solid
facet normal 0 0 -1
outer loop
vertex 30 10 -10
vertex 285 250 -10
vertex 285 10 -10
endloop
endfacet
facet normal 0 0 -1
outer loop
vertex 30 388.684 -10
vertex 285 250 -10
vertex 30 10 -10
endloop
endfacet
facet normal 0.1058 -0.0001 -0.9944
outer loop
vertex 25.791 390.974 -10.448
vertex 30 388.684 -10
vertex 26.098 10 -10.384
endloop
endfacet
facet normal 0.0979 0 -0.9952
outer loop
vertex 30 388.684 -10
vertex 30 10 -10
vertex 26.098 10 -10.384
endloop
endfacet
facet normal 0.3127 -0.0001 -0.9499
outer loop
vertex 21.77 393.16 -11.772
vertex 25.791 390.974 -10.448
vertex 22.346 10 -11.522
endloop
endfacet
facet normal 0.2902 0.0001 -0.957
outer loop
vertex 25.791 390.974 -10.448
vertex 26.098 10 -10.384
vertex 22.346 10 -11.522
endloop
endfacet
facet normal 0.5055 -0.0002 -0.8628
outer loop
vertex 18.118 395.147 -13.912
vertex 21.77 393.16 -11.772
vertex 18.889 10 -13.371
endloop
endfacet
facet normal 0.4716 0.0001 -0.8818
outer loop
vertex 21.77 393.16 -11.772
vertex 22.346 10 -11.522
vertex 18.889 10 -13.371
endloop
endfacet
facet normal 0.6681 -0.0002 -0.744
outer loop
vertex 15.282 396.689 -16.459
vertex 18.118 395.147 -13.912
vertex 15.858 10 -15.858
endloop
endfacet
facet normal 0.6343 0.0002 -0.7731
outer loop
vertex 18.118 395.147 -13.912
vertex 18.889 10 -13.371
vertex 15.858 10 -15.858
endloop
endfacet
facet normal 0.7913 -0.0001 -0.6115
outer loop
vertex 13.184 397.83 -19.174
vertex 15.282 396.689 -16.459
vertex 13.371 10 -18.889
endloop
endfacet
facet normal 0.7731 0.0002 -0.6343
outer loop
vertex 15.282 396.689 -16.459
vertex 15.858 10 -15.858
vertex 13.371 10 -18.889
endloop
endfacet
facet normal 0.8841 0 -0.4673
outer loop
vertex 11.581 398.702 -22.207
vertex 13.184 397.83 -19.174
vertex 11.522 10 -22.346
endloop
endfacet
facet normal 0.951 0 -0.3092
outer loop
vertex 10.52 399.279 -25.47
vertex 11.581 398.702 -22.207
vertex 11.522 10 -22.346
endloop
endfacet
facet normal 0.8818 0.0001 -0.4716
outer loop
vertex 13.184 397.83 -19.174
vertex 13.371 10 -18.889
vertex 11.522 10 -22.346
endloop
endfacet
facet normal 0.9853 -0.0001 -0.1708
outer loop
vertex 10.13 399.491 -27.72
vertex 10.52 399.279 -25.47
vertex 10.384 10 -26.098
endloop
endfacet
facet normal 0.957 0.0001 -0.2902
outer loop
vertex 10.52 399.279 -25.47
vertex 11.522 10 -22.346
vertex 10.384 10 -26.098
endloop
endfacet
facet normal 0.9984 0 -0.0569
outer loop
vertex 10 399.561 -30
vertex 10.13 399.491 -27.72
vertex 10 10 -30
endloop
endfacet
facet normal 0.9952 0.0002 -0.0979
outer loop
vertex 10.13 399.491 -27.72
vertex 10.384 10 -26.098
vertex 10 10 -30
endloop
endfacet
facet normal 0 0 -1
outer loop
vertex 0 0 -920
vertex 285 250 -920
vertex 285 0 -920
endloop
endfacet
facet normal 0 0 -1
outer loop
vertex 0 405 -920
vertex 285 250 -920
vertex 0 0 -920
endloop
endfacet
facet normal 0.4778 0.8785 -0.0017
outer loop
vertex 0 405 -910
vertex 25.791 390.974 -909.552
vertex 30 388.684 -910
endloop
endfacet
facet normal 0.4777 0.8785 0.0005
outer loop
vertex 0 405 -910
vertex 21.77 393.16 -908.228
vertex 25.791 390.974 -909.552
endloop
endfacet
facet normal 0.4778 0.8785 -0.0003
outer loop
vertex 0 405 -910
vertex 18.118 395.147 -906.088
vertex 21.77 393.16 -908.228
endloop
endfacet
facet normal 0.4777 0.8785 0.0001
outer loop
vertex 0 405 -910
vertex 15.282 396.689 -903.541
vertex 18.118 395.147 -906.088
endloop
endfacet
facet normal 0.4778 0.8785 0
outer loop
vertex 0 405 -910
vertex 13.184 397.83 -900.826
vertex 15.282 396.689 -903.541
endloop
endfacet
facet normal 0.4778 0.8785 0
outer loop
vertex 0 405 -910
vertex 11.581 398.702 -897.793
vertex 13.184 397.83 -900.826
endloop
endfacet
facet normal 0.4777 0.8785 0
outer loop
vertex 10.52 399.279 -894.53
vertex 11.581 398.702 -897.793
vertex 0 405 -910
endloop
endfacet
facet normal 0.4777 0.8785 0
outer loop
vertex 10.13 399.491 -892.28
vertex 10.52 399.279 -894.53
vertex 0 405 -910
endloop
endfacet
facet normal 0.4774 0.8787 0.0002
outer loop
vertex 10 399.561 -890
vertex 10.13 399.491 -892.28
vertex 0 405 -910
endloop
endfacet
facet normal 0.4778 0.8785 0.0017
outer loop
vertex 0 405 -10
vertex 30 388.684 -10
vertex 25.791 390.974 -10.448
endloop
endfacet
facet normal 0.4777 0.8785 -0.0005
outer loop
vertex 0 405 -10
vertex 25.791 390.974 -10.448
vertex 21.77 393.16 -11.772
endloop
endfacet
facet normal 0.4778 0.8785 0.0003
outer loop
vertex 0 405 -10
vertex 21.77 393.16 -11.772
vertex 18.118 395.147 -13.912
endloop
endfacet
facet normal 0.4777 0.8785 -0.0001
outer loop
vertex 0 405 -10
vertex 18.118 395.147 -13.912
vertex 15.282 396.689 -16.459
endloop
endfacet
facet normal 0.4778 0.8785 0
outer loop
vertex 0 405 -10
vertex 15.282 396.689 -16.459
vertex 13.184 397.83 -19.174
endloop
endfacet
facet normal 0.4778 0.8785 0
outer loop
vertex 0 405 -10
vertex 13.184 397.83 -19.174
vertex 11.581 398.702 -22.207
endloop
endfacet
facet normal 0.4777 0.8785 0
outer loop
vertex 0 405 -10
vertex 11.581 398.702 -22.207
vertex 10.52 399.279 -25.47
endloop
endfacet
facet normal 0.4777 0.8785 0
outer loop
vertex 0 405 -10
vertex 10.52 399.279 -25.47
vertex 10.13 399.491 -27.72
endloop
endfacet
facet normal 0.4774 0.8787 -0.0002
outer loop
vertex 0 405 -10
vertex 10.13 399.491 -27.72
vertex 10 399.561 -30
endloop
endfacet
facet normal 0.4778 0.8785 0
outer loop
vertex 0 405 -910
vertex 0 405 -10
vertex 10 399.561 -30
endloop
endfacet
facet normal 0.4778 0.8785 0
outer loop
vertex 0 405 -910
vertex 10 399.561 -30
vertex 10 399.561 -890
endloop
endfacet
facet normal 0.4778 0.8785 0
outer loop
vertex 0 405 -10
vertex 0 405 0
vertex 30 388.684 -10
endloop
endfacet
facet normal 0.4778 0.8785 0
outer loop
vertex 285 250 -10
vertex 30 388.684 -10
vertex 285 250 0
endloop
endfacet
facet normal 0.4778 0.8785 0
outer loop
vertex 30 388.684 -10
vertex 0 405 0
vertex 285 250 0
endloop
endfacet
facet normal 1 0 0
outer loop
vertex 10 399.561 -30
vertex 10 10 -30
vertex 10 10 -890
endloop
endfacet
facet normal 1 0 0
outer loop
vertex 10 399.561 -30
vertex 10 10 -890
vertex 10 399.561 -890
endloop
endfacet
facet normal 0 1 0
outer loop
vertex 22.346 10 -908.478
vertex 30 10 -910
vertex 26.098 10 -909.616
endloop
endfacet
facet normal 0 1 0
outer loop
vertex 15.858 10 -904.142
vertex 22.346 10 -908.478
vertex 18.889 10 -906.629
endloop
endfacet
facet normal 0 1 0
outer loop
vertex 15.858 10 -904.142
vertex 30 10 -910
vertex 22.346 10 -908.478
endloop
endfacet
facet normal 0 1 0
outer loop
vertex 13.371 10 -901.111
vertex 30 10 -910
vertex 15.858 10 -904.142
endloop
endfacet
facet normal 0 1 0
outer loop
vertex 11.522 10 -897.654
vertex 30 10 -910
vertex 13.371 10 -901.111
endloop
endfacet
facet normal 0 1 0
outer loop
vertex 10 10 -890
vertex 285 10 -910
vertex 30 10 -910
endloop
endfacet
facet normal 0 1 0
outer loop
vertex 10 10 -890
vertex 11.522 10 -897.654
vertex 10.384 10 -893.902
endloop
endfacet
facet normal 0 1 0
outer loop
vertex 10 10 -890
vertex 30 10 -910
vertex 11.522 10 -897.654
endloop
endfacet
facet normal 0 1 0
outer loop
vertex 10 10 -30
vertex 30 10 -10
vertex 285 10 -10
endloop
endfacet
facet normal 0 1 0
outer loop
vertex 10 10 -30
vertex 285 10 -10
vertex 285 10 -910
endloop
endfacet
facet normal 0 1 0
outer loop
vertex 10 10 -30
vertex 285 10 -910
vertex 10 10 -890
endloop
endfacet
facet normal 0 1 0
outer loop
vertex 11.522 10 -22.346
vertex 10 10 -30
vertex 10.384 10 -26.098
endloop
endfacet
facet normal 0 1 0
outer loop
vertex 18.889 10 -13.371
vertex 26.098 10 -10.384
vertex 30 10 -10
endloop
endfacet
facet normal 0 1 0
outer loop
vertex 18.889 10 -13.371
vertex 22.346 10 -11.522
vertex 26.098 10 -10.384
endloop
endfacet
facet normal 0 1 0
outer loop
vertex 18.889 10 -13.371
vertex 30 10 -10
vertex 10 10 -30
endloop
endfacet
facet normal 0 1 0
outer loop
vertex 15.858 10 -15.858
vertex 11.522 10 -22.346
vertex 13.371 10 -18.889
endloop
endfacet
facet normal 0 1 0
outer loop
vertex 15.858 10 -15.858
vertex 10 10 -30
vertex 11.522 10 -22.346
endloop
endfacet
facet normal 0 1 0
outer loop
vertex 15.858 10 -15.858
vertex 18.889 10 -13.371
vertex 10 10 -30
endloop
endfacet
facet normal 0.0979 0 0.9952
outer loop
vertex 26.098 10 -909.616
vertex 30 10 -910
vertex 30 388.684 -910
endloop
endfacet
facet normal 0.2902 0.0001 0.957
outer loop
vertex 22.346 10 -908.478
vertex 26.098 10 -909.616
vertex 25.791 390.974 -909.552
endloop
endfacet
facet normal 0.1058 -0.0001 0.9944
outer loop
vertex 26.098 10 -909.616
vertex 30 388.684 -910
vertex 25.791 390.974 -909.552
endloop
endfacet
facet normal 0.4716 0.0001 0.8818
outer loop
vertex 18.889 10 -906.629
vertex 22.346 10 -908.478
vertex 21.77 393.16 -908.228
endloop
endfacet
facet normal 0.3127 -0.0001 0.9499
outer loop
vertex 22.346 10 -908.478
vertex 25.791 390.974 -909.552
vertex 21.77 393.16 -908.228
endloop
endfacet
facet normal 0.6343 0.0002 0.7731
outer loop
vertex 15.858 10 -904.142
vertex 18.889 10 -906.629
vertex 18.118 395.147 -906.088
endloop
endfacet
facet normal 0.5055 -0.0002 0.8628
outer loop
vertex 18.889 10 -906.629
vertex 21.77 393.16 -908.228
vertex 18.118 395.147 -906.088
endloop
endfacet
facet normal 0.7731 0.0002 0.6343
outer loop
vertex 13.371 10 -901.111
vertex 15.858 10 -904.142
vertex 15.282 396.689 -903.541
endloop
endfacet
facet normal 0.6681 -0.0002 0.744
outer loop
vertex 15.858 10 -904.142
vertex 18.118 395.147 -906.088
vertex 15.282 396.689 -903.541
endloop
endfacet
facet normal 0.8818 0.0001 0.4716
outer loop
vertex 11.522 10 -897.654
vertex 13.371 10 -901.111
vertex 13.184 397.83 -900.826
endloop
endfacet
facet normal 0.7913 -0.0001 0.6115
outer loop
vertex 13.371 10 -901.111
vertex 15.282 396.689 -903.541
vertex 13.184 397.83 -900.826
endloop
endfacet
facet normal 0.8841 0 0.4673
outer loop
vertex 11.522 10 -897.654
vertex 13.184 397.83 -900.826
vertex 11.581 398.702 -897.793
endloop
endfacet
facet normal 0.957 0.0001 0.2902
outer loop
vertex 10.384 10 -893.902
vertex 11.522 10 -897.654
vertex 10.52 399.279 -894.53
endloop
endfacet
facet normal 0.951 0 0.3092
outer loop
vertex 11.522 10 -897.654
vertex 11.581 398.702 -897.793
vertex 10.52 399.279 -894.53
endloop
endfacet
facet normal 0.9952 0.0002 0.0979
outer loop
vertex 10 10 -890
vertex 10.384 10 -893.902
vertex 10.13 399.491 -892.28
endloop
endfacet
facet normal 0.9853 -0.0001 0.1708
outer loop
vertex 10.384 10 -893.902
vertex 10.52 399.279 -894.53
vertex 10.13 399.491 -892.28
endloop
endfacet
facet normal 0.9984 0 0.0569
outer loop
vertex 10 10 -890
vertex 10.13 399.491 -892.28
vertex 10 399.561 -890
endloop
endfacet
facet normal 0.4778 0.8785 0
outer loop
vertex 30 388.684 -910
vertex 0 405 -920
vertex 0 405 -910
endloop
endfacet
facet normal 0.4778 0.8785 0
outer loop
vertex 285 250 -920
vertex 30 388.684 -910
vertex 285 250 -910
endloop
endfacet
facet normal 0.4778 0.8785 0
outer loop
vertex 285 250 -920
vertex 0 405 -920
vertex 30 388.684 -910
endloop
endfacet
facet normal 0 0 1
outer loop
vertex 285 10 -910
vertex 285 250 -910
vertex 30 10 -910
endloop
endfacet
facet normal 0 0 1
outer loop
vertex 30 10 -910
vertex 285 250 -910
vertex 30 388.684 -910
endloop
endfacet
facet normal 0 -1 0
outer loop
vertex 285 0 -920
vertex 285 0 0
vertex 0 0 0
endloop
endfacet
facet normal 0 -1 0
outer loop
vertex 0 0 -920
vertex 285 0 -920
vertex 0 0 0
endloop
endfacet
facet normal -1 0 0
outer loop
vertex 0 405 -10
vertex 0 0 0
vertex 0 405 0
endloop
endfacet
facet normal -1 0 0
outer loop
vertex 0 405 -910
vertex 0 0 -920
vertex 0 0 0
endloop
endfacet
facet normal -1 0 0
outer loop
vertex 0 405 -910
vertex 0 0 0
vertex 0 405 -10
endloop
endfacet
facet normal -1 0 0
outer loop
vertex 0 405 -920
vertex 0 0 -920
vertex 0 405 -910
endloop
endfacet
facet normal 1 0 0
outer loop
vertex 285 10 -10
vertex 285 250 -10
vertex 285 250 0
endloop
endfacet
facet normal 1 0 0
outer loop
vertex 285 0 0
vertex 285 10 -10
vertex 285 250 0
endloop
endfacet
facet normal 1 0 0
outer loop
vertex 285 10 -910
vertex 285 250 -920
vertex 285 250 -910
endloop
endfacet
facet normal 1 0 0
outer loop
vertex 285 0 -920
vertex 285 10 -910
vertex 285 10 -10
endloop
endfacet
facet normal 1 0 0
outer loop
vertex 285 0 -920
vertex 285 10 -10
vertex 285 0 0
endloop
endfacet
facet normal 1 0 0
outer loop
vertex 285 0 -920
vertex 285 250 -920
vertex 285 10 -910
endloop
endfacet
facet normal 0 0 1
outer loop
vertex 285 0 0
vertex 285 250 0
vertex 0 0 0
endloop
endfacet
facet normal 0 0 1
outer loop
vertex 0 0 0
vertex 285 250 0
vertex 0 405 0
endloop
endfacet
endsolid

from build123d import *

# Parameters (mm, degrees)
BOSS_EXTRUDE1_DEPTH = 10
BOSS_EXTRUDE2_DEPTH = 910
FILLET1_R           = 20


with BuildPart() as part:
    # Sketch1 → Boss-Extrude1 (new body)
    with BuildSketch(Plane.XY):
        Polygon((0, 405), (285, 250), (285, 0), (0, 0), align=None)
    boss_extrude1 = extrude(amount=-BOSS_EXTRUDE1_DEPTH)

    # Sketch2 → Boss-Extrude2 (add)
    with BuildSketch(Plane.XY):
        Polygon((10, 0), (285, 0), (285, 10), (10, 10), (10, 399.561403509), (0, 405), (0, 10), (0, 0), align=None)
    extrude(amount=-BOSS_EXTRUDE2_DEPTH)

    # Mirror1: Boss-Extrude1 across plane
    add(boss_extrude1.mirror(Plane(origin=(0, 0, -460), x_dir=(1, 0, 0), z_dir=(0, 0, -1))))

    # Fillet1
    fillet1_edges = [part.edges().sort_by_distance(p)[0] for p in [
        (10, 204.780701754, -10),
        (10, 204.780701754, -910),
    ]]
    fillet(fillet1_edges, radius=FILLET1_R)


solid = part.part
